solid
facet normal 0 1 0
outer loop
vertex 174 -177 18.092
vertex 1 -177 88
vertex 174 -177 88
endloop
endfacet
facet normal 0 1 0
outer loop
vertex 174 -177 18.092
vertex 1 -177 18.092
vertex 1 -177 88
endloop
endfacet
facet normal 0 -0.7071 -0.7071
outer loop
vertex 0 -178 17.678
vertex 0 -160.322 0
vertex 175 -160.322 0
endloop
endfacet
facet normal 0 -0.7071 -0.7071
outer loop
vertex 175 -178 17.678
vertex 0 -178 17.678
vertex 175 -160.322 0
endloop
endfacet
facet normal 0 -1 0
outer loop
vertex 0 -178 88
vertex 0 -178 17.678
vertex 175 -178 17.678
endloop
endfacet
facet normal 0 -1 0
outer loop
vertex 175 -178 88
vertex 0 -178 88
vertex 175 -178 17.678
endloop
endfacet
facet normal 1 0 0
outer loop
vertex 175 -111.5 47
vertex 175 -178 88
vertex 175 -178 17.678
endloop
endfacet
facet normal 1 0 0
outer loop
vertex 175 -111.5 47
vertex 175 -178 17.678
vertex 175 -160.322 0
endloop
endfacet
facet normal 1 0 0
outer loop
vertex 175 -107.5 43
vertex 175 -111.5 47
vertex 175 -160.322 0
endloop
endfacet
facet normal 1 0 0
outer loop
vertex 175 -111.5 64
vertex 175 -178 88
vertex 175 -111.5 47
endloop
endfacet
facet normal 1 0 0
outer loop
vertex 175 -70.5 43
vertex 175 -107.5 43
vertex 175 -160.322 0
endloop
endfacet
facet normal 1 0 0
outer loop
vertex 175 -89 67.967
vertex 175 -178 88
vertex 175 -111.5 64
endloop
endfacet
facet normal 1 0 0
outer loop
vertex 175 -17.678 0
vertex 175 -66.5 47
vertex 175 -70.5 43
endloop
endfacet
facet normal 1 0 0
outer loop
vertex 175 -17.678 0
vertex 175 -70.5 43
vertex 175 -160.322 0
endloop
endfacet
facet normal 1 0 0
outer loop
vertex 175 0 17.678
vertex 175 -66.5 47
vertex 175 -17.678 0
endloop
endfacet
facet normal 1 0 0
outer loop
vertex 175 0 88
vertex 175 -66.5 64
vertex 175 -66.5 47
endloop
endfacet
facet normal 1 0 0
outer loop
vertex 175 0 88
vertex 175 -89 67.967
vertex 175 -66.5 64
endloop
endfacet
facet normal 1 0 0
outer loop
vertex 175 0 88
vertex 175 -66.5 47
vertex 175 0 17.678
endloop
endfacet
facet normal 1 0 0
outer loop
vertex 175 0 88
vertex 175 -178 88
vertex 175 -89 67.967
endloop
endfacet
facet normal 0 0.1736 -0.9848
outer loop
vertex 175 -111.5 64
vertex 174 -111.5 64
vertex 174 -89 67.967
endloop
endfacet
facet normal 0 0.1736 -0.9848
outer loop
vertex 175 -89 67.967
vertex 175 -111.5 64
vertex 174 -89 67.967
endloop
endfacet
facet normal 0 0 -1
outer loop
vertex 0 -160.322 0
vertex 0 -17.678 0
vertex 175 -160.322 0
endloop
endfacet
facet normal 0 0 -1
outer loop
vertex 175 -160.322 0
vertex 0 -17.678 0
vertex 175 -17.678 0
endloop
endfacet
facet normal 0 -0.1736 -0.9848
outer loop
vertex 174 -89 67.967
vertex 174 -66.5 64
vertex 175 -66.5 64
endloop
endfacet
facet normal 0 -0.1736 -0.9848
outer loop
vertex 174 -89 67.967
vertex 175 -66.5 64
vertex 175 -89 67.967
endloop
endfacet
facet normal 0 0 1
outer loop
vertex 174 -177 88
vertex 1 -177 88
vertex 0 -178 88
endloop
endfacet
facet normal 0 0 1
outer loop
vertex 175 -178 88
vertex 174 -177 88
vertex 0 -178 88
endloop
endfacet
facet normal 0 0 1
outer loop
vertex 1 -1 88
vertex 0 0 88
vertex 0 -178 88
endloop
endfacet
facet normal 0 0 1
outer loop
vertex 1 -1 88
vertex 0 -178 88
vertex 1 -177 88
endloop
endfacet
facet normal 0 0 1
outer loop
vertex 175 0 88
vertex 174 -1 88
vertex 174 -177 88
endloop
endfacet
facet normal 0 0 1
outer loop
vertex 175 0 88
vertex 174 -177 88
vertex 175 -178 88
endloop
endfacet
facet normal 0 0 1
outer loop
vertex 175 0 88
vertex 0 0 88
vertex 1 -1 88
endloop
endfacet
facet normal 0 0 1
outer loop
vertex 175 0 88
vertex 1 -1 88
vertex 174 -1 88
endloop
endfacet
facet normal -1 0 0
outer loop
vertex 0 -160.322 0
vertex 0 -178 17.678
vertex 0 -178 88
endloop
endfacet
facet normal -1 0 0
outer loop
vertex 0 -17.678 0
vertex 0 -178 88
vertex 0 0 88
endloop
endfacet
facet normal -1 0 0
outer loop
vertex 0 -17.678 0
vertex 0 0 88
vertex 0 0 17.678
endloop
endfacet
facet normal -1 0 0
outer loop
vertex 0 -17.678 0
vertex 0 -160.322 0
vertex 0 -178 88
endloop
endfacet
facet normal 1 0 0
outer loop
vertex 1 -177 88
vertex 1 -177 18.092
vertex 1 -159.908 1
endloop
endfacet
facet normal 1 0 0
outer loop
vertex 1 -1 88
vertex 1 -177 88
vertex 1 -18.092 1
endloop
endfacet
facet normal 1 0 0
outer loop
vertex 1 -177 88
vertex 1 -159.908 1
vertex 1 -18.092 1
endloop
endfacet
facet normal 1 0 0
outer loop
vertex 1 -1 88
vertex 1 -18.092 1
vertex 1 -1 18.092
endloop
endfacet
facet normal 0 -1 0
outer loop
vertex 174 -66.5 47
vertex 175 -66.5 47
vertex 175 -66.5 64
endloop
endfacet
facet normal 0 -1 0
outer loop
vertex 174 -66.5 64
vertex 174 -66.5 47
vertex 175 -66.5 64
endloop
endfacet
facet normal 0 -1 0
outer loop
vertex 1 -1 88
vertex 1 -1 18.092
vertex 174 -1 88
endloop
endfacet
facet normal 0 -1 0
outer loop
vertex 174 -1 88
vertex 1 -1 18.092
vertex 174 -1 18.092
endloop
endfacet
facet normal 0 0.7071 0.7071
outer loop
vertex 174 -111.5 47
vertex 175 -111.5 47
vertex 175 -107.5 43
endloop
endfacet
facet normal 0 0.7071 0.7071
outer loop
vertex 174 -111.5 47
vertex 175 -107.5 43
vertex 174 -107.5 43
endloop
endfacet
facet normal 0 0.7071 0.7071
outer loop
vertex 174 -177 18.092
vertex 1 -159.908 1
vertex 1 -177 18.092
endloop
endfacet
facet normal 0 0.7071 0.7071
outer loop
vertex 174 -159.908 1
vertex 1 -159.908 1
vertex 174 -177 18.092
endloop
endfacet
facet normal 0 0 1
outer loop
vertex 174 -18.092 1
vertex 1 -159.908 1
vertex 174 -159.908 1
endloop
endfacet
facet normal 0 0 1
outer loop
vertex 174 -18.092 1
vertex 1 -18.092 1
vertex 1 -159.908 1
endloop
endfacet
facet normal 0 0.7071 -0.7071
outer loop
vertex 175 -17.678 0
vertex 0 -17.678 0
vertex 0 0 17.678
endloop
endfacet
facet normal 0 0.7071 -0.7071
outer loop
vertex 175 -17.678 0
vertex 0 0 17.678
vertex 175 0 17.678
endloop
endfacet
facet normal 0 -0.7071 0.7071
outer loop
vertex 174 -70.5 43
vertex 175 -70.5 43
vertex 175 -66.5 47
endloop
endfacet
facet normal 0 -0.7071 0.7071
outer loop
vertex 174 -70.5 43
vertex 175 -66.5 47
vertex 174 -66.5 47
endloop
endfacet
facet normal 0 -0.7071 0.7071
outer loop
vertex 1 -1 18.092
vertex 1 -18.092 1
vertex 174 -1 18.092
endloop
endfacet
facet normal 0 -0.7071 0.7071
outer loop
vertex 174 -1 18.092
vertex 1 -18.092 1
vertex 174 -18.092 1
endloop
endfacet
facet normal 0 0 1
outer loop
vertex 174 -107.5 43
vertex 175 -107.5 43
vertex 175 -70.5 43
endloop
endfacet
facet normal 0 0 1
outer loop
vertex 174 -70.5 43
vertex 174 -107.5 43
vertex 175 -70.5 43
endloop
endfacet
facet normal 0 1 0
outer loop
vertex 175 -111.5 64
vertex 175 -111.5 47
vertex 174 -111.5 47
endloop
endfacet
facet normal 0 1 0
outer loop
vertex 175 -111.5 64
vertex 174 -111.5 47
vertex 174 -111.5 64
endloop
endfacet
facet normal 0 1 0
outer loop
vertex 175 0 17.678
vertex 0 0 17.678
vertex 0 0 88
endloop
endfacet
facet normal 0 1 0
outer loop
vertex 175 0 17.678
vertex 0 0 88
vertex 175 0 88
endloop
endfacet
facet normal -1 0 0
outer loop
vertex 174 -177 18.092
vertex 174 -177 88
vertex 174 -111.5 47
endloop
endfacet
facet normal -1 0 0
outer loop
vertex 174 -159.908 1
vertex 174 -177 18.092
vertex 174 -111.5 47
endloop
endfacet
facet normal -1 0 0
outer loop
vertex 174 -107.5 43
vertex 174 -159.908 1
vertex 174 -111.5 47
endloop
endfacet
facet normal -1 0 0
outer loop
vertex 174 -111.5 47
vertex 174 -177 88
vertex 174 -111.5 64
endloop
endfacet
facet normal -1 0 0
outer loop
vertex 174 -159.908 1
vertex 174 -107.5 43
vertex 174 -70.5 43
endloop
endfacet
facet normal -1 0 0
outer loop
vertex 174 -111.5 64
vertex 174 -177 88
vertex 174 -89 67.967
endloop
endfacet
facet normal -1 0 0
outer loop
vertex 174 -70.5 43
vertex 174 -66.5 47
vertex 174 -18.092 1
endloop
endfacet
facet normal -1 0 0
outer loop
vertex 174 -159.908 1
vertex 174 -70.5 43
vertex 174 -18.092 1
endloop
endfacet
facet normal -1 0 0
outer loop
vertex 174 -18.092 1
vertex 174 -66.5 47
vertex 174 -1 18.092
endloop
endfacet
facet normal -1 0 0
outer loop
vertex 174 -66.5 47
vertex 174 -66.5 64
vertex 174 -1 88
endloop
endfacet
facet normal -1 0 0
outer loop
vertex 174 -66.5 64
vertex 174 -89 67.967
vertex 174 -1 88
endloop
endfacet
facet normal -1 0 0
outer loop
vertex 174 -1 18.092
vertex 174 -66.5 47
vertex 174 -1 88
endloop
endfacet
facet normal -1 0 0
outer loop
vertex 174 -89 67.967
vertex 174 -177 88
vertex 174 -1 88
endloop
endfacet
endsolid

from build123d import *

# Parameters (mm, degrees)
F0_W        = 175
F0_H        = 178
F1_DEPTH    = 88
F2_SIZE     = 17.678
F3_T        = -1
F4_W        = 45
F4_H        = 25
F5_DEPTH    = 2
F6_T1_DEPTH = 1
F7_SIZE     = 4


# Not quite as in the source:
# - a fillet or chamfer that OpenCascade refuses, or shapes differently, is made with other operations: its cross-section is extruded or revolved along the edge and cut away or added


with BuildPart() as f1:
    # F0 (on Top) → F1 (new body)
    with BuildSketch(Plane.XY):
        with Locations((87.5, -89)):
            Rectangle(F0_W, F0_H)
    extrude(amount=F1_DEPTH)

    # F2
    f2_edges = [f1.edges().sort_by_distance(p)[0] for p in [
        (87.5, -178, 0),
        (87.5, 0, 0),
    ]]
    chamfer(f2_edges, length=F2_SIZE)

    # F3
    f3_openings = [f1.faces().sort_by_distance(p)[0] for p in [
        (87.5, -89, 88),
    ]]
    offset(amount=F3_T, openings=f3_openings)

    # F4 (on face) → F5 (cut)
    with BuildSketch(Plane.YZ.offset(175)):
        with Locations((-89, 55.5)):
            Rectangle(F4_W, F4_H)
    extrude(amount=-F5_DEPTH, mode=Mode.SUBTRACT)

    # F6: chamfer of 4 x 22.6851272785 on 2 edges, made by hand

    # F6_s2 → F6_t1 (join)
    with BuildSketch(Plane.YZ.offset(174)):
        Polygon((-111.5, 64), (-88.8148727215, 68), (-111.5, 68), align=None)
        Polygon((-66.5, 64), (-89.1851272785, 68), (-66.5, 68), align=None)
    extrude(amount=F6_T1_DEPTH)

    # F7
    f7_edges = [f1.edges().sort_by_distance(p)[0] for p in [
        (174.5, -111.5, 43),
        (174.5, -66.5, 43),
    ]]
    chamfer(f7_edges, length=F7_SIZE)


solid = f1.part
